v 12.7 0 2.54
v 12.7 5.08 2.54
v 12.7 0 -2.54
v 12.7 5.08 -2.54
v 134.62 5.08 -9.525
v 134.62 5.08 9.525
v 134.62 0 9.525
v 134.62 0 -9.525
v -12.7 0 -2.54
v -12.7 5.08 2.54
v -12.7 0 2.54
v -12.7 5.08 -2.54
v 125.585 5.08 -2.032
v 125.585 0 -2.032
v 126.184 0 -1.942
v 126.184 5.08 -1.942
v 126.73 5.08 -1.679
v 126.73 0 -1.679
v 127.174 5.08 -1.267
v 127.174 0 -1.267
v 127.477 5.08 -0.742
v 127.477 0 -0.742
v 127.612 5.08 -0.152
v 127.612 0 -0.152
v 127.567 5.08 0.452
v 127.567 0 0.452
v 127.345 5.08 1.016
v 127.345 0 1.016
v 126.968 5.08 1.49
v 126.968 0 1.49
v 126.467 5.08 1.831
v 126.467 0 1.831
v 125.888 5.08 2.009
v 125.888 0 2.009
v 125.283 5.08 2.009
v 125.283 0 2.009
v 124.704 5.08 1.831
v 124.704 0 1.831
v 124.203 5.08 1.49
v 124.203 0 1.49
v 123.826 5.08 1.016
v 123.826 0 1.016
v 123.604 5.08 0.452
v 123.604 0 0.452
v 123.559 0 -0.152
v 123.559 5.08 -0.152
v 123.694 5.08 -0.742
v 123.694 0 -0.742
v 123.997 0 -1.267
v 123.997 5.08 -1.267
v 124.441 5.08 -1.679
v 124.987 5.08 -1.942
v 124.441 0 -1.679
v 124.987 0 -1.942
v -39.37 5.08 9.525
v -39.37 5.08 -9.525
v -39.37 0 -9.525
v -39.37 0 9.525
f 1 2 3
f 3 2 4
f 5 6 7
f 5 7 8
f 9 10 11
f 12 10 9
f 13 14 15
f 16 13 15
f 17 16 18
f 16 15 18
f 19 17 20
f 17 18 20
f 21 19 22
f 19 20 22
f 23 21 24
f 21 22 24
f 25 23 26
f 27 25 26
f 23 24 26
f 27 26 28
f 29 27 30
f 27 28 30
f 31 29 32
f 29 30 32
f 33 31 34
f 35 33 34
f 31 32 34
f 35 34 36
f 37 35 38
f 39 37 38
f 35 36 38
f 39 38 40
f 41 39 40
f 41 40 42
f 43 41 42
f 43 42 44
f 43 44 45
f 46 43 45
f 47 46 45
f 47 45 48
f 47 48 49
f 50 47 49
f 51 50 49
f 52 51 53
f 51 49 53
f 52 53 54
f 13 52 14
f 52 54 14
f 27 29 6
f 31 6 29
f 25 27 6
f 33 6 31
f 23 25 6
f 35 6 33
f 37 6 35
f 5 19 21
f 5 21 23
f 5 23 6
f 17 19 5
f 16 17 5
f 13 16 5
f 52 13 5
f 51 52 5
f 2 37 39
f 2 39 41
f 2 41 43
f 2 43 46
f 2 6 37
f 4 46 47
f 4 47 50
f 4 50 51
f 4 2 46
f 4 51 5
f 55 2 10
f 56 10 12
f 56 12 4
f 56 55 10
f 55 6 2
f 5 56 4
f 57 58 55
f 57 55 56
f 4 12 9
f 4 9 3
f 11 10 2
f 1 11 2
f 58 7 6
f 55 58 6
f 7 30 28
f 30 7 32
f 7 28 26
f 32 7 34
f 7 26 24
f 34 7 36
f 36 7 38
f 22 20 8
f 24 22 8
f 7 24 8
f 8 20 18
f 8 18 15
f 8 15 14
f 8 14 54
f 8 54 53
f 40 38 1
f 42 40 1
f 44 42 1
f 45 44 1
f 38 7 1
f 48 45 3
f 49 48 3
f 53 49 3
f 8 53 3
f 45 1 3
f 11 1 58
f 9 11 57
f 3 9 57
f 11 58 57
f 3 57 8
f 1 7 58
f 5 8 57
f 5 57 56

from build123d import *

# Parameters (mm, degrees)
SKETCH1_W           = 78.74
SKETCH1_H           = 19.05
BOSS_EXTRUDE1_DEPTH = 5.08
SKETCH2_W           = 25.4
SKETCH2_H           = 5.08
CUT_EXTRUDE1_DEPTH  = 41.823142028
SKETCH3_W           = 19.05
SKETCH3_H           = 5.08
BOSS_EXTRUDE2_DEPTH = 95.25
SKETCH4_R           = 2.032
CUT_EXTRUDE2_DEPTH  = 5.08


with BuildPart() as part:
    # Sketch1 → Boss-Extrude1 (new body)
    with BuildSketch(Plane(origin=(0, 0, 0), x_dir=(1, 0, 0), z_dir=(0, 1, 0))):
        Rectangle(SKETCH1_W, SKETCH1_H)
    extrude(amount=BOSS_EXTRUDE1_DEPTH)

    # Sketch2 → Cut-Extrude1 (cut, through all)
    with BuildSketch(Plane(origin=(0, 5.08, 0), x_dir=(1, 0, 0), z_dir=(0, 1, 0))):
        Rectangle(SKETCH2_W, SKETCH2_H)
    extrude(amount=-CUT_EXTRUDE1_DEPTH, mode=Mode.SUBTRACT)

    # Sketch3 → Boss-Extrude2 (add)
    with BuildSketch(Plane(origin=(39.37, 0, 0), x_dir=(0, 0, -1), z_dir=(1, 0, 0))):
        with Locations((0, 2.54)):
            Rectangle(SKETCH3_W, SKETCH3_H)
    extrude(amount=BOSS_EXTRUDE2_DEPTH)

    # Sketch4 → Cut-Extrude2 (cut)
    with BuildSketch(Plane.XZ):
        with Locations(Location((125.585488771, 0, 0), (0, 0, 270))):
            Circle(SKETCH4_R)
    extrude(amount=-CUT_EXTRUDE2_DEPTH, mode=Mode.SUBTRACT)


solid = part.part
